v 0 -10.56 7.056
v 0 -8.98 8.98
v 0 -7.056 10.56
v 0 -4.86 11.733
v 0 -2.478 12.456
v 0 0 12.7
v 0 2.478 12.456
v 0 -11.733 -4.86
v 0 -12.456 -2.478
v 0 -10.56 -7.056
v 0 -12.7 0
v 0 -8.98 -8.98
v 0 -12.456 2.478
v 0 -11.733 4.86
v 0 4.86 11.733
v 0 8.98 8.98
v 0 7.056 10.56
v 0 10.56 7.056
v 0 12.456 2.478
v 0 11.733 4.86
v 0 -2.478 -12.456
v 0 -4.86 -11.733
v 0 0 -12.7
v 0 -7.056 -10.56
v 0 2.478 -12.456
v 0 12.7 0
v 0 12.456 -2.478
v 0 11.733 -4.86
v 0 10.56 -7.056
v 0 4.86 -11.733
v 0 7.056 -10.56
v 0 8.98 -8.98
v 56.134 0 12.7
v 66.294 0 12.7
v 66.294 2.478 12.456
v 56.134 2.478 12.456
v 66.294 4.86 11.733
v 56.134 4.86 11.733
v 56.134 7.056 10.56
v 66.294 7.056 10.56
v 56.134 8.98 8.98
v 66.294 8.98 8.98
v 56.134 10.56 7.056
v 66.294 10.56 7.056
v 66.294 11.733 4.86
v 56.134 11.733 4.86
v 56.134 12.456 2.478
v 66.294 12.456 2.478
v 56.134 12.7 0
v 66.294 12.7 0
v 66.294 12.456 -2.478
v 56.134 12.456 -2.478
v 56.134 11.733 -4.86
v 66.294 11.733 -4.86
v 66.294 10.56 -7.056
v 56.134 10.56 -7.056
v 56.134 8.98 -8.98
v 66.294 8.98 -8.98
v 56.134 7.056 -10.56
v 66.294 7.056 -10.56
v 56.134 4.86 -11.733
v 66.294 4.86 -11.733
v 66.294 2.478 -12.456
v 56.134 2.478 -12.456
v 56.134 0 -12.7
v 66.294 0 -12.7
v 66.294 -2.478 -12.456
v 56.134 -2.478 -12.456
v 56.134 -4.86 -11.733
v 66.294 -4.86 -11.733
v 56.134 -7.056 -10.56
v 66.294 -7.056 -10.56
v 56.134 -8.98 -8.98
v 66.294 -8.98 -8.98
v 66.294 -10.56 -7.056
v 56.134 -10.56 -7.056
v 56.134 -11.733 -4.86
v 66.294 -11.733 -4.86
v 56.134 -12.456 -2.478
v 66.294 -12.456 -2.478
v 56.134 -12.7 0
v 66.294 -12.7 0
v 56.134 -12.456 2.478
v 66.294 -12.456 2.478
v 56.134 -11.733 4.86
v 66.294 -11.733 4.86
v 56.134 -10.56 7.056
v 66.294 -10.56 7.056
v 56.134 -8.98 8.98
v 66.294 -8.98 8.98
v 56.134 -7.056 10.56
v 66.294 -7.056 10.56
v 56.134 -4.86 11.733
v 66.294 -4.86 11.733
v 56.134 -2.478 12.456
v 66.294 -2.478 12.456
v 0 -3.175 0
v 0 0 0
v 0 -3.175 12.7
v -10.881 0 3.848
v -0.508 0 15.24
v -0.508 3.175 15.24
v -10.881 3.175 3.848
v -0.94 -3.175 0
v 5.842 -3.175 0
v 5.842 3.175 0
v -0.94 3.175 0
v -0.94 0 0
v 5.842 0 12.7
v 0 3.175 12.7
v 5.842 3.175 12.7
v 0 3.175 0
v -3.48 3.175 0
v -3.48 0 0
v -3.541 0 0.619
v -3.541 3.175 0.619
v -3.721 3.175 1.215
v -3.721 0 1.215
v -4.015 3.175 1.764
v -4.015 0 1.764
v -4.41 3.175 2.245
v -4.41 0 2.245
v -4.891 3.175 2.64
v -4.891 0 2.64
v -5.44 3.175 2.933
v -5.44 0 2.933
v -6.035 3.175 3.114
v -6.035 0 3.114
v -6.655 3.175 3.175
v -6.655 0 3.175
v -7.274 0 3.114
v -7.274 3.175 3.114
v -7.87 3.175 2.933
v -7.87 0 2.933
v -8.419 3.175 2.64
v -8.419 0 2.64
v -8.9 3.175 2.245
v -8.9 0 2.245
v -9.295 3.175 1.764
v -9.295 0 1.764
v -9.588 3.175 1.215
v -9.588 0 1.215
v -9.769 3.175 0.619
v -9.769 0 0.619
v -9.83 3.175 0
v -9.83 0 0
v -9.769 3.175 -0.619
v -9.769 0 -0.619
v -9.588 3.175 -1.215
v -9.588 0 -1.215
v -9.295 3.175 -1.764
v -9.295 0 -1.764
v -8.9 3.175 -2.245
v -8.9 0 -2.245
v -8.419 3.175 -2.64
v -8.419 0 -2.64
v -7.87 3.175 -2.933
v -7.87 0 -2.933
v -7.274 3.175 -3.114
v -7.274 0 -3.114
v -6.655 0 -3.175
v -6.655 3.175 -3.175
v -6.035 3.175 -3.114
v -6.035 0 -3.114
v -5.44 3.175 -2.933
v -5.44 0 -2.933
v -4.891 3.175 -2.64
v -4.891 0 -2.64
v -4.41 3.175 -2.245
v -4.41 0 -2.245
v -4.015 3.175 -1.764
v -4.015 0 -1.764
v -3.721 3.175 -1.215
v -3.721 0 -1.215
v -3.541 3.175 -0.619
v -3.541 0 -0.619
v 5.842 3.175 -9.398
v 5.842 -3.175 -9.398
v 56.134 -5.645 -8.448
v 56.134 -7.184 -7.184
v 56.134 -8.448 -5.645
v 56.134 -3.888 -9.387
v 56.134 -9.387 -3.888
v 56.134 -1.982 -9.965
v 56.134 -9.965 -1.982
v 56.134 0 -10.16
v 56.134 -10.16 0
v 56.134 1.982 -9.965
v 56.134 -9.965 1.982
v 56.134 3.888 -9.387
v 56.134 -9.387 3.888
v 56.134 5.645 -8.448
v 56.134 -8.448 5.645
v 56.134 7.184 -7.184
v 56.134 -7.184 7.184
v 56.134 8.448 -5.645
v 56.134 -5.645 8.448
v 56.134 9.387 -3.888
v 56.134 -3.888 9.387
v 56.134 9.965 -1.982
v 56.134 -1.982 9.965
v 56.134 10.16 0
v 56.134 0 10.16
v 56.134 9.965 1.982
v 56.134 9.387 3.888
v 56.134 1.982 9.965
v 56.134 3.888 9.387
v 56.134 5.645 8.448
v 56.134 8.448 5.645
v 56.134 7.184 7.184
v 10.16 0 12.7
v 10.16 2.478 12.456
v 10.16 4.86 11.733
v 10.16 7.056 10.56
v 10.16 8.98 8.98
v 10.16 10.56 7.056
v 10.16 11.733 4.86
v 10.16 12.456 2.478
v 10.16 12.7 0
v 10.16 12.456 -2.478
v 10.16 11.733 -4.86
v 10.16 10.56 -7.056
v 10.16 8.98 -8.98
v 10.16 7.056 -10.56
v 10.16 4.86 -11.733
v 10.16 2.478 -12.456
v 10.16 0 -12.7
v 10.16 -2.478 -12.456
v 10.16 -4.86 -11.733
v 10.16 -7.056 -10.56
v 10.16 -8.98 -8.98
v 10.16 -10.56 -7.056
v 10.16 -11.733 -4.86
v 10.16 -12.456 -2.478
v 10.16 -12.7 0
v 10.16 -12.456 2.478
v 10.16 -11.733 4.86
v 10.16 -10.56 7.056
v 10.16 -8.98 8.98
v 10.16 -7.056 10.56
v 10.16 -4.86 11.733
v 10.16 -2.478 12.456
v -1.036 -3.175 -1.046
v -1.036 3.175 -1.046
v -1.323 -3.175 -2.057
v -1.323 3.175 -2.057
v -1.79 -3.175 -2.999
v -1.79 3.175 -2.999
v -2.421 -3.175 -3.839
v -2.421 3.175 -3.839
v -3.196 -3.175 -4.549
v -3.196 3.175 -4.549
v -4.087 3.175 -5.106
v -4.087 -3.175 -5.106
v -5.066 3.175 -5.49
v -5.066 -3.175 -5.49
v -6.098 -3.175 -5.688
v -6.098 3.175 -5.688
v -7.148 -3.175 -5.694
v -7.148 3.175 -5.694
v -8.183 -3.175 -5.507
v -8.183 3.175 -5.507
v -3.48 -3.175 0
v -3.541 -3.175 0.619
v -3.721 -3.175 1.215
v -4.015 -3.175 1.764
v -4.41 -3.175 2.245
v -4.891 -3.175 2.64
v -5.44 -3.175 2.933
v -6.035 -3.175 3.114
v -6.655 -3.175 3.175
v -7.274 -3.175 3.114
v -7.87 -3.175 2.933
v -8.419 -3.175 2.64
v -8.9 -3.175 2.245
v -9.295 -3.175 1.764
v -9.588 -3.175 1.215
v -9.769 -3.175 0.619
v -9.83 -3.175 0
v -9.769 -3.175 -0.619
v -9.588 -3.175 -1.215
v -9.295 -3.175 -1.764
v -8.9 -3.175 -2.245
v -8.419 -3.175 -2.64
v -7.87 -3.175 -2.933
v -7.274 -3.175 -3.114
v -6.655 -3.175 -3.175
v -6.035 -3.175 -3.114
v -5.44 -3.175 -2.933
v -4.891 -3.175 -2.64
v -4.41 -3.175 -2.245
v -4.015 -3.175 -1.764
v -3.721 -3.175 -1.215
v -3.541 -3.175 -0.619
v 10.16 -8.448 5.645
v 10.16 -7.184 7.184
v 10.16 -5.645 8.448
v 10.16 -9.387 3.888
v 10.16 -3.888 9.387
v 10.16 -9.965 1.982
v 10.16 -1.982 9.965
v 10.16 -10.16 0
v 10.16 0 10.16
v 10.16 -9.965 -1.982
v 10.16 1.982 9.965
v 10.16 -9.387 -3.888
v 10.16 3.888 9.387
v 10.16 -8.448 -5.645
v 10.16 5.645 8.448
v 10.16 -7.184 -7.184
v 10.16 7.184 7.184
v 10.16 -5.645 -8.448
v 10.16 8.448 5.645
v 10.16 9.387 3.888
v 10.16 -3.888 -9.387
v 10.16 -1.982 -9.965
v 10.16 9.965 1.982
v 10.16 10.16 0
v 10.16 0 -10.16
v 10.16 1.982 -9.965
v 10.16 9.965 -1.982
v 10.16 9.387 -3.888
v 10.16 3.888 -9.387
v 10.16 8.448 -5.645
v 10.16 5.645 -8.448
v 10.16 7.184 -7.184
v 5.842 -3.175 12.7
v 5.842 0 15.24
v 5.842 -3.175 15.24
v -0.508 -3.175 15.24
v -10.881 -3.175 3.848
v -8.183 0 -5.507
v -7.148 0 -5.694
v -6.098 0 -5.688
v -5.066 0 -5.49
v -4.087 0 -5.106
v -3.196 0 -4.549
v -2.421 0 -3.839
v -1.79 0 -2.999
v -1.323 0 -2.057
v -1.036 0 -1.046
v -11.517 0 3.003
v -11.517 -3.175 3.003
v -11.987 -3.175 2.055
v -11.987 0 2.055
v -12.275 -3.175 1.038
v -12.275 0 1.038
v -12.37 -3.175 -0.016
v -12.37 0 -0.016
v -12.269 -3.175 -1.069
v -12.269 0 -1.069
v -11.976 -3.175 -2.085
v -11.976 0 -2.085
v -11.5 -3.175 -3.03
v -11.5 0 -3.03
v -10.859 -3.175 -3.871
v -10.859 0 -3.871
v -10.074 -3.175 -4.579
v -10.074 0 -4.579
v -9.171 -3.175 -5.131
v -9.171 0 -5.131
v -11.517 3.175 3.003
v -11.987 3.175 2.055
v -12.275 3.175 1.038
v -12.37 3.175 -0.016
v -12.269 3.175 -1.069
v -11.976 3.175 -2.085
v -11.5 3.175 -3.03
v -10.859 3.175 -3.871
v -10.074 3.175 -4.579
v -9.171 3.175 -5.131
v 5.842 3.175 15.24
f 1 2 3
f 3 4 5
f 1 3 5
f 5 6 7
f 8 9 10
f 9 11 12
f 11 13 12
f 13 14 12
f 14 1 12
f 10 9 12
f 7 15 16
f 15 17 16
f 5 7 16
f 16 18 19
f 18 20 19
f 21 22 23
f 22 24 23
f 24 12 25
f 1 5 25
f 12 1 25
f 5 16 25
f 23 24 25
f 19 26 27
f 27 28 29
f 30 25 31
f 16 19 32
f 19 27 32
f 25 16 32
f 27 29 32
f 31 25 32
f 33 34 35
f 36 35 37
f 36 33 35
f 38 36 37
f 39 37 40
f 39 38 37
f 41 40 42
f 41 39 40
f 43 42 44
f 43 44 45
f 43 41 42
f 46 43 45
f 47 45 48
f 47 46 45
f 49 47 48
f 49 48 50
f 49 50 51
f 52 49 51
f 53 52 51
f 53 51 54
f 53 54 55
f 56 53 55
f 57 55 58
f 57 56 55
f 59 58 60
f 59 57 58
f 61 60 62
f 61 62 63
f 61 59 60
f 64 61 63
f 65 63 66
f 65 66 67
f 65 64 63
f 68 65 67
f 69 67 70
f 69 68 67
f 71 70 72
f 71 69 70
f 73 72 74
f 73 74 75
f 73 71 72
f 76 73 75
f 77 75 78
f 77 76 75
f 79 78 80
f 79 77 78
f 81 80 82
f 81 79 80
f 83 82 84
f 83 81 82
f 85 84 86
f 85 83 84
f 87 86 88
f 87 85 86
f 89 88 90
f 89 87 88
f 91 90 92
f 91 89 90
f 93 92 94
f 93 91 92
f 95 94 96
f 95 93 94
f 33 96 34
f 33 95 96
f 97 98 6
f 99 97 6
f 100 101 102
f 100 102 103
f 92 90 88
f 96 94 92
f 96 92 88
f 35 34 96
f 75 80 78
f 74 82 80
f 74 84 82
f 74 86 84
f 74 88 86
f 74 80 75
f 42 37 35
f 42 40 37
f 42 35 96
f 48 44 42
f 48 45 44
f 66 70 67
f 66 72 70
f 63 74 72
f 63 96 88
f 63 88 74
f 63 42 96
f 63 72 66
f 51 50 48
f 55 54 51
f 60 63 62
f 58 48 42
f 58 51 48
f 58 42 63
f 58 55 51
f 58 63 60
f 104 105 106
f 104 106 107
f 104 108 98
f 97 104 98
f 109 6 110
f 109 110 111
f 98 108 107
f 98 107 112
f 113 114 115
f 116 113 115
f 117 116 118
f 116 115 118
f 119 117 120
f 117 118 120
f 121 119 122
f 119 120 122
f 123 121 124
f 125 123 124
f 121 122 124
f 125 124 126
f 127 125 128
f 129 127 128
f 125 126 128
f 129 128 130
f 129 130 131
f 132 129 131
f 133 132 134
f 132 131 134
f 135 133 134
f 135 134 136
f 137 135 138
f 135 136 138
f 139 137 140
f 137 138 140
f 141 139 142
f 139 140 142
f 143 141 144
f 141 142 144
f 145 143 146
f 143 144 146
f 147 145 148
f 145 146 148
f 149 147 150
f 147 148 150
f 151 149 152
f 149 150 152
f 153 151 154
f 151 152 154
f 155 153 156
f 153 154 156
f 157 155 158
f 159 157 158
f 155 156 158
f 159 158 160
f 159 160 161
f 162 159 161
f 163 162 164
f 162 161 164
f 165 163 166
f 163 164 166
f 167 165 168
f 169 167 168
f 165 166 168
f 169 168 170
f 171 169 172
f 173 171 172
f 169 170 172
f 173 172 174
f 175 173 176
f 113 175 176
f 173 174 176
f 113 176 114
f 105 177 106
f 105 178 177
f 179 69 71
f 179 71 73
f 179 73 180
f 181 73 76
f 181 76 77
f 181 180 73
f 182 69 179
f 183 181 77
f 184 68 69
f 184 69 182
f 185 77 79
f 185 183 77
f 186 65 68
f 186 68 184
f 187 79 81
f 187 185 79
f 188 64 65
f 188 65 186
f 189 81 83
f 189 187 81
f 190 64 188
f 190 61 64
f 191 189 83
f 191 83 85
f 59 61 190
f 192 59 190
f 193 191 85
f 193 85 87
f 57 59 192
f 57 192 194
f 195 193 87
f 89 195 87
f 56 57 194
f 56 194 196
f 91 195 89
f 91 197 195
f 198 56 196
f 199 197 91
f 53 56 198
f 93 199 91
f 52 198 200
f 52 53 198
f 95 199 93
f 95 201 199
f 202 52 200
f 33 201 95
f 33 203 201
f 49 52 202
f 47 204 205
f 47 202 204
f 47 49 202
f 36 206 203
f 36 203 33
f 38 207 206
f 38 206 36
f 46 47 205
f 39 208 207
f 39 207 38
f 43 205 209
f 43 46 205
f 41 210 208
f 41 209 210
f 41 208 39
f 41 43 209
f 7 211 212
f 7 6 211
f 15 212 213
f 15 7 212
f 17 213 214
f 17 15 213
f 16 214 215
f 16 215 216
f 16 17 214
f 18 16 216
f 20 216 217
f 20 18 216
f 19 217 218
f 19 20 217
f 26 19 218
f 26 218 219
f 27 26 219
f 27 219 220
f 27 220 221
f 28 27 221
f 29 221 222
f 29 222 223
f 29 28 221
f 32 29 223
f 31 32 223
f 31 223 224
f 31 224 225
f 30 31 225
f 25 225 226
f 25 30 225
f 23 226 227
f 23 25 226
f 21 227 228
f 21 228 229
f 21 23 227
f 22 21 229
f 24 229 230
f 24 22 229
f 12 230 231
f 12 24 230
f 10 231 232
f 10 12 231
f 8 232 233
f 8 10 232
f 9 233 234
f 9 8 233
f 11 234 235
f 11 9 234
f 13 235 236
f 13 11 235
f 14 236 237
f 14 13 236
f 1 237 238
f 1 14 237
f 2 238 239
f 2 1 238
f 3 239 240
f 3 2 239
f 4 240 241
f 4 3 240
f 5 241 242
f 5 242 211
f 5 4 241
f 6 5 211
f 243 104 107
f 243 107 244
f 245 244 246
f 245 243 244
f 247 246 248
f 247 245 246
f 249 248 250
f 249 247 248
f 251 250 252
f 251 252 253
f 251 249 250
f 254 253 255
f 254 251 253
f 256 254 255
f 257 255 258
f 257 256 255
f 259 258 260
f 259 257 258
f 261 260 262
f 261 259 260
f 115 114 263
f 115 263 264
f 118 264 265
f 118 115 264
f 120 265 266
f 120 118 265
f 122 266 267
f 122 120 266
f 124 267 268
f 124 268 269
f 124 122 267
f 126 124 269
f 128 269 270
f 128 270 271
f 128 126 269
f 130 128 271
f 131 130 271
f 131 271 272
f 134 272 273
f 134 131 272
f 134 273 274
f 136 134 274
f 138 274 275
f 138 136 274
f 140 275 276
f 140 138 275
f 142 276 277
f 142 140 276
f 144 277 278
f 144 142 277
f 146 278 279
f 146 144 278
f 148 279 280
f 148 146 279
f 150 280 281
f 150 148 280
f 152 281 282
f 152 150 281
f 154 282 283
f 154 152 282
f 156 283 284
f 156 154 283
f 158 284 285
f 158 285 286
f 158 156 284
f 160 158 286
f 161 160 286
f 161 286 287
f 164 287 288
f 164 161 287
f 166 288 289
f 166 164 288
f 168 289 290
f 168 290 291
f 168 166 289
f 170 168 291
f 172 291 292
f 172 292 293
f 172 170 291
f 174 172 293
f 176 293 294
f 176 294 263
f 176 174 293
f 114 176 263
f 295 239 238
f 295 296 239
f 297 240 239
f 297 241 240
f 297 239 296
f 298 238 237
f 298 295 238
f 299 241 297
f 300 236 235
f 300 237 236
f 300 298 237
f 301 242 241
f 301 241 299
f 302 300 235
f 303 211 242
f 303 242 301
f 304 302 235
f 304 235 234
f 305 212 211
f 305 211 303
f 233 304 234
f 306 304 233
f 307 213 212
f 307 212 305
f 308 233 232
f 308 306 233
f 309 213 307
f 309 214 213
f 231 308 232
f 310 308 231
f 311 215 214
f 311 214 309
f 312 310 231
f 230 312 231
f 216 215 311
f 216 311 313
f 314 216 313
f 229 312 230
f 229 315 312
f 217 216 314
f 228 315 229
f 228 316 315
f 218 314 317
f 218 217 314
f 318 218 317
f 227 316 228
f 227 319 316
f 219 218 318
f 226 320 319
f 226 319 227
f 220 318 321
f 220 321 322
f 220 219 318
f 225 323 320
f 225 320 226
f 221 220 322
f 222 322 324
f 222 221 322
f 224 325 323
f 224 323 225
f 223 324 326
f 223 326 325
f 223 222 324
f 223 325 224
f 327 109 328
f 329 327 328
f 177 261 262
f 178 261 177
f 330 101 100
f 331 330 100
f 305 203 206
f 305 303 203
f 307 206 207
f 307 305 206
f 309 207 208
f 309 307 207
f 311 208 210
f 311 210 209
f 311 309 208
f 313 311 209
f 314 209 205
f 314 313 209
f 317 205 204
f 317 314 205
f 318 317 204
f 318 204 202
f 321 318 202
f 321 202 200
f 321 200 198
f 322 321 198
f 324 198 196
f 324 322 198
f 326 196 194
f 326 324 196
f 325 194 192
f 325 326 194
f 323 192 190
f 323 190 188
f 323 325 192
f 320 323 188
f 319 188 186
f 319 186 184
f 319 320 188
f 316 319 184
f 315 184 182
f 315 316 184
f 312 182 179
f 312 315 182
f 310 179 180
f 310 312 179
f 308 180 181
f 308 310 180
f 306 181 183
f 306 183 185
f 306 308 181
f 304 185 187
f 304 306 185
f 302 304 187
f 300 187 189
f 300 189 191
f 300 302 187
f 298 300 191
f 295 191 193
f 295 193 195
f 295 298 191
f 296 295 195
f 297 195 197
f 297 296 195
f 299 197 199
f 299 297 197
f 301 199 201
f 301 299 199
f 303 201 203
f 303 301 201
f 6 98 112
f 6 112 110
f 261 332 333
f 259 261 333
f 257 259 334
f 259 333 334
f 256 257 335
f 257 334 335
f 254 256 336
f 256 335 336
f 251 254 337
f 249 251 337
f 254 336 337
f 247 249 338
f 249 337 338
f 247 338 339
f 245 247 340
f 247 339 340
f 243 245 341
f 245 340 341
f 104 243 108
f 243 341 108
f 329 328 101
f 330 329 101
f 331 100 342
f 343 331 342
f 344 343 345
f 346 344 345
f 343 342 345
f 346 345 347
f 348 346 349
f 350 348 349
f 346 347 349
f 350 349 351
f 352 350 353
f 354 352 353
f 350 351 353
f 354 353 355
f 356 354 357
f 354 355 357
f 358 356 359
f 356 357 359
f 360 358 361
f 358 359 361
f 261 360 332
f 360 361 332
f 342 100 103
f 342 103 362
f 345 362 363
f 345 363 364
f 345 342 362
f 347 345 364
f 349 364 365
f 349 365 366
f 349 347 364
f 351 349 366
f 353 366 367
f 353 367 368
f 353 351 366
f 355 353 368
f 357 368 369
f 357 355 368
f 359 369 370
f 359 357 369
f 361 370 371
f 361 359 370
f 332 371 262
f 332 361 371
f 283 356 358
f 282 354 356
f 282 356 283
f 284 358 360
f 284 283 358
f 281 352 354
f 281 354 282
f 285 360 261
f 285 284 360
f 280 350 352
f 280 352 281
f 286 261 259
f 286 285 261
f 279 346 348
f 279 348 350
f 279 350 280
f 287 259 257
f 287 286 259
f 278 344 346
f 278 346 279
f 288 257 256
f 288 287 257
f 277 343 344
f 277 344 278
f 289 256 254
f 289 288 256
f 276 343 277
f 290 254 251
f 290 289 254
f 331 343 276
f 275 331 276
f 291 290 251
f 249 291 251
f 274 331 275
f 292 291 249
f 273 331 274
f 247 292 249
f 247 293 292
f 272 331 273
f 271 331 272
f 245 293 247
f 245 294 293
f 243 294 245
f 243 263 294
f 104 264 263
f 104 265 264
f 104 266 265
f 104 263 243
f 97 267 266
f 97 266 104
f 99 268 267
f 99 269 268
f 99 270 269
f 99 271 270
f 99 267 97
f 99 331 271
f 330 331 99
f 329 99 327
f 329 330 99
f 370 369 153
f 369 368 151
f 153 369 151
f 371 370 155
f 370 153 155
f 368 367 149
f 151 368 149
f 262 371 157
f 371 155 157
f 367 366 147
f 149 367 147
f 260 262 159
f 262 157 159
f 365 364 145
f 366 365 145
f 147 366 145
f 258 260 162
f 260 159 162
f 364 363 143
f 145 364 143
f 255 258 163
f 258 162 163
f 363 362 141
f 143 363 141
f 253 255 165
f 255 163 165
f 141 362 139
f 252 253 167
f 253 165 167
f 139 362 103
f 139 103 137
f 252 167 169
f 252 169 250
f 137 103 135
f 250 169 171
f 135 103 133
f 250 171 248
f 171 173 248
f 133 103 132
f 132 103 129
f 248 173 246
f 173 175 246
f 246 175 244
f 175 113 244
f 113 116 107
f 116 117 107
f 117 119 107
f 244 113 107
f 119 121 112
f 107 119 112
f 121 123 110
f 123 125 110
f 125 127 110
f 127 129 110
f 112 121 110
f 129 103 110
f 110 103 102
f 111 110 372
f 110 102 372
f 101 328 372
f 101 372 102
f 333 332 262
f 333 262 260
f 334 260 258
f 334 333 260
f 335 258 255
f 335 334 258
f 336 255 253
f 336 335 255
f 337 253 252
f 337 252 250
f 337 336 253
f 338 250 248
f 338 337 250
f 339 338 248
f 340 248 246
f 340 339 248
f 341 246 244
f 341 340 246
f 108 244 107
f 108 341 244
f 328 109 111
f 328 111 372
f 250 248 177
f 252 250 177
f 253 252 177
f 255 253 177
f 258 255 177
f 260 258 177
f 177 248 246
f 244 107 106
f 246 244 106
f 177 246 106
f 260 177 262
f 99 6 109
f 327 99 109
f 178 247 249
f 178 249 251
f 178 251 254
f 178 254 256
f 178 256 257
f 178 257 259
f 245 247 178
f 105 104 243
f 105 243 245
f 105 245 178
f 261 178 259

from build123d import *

# Parameters (mm, degrees)
F0_W     = 5.842
F0_H     = 12.7
F0_R     = 3.175
F3_DEPTH = 3.175


# Not quite as in the source:
# - a feature of the source that left no trace in its solid (it failed there, or was rolled back) is left out


with BuildPart() as f1:
    # F0 (on Front) → F1 (revolve)
    with BuildSketch(Plane.XZ):
        Polygon((5.842, 12.7), (5.842, 0), (66.294, 0), (66.294, 12.7), (56.134, 12.7), (56.134, 10.16), (10.16, 10.16), (10.16, 12.7), align=None)
        with Locations((2.921, 6.35)):
            Rectangle(F0_W, F0_H)
    revolve(axis=Axis((33.147, 0, 0), (-1, 0, 0)))


with BuildPart() as f3:
    # F0 (on Front) → F3 (new body, symmetric)
    with BuildSketch(Plane.XZ):
        with BuildLine():
            ThreePointArc((-8.1826630726, -5.5069827884), (-3.1957909266, -4.5493385486), (-0.9398, 0))
            ThreePointArc((-0.9398, 0), (-4.5919612295, 5.3297205562), (-10.8806298187, 3.8475430269))
            ThreePointArc((-10.8806298187, 3.8475430269), (-12.1459778134, -1.5837270034), (-8.1826630726, -5.5069827884))
        make_face()
        with Locations((-6.6548, 0)):
            Circle(F0_R, mode=Mode.SUBTRACT)
        with BuildLine():
            Line((-0.9398, 0), (0, 0))
            Line((0, 0), (0, 12.7))
            Line((0, 12.7), (5.842, 12.7))
            Line((5.842, 12.7), (5.842, 15.24))
            Line((5.842, 15.24), (-0.508, 15.24))
            Line((-0.508, 15.24), (-10.8806298187, 3.8475430269))
            ThreePointArc((-10.8806298187, 3.8475430269), (-4.5919612295, 5.3297205562), (-0.9398, 0))
        make_face()
    extrude(amount=F3_DEPTH, both=True)


with BuildPart() as f3b:
    # F2 (on face) → F3, piece 2 (new body, symmetric)
    with BuildSketch(Plane.XZ):
        with BuildLine():
            Line((5.842, -9.398), (5.842, 0))
            Line((5.842, 0), (0, 0))
            Line((0, 0), (-0.9398, 0))
            ThreePointArc((-0.9398, 0), (-3.1957909266, -4.5493385486), (-8.1826630726, -5.5069827884))
            Line((-8.1826630726, -5.5069827884), (5.842, -9.398))
        make_face()
    extrude(amount=F3_DEPTH, both=True)


solid = Compound([f1.part, f3.part, f3b.part])
